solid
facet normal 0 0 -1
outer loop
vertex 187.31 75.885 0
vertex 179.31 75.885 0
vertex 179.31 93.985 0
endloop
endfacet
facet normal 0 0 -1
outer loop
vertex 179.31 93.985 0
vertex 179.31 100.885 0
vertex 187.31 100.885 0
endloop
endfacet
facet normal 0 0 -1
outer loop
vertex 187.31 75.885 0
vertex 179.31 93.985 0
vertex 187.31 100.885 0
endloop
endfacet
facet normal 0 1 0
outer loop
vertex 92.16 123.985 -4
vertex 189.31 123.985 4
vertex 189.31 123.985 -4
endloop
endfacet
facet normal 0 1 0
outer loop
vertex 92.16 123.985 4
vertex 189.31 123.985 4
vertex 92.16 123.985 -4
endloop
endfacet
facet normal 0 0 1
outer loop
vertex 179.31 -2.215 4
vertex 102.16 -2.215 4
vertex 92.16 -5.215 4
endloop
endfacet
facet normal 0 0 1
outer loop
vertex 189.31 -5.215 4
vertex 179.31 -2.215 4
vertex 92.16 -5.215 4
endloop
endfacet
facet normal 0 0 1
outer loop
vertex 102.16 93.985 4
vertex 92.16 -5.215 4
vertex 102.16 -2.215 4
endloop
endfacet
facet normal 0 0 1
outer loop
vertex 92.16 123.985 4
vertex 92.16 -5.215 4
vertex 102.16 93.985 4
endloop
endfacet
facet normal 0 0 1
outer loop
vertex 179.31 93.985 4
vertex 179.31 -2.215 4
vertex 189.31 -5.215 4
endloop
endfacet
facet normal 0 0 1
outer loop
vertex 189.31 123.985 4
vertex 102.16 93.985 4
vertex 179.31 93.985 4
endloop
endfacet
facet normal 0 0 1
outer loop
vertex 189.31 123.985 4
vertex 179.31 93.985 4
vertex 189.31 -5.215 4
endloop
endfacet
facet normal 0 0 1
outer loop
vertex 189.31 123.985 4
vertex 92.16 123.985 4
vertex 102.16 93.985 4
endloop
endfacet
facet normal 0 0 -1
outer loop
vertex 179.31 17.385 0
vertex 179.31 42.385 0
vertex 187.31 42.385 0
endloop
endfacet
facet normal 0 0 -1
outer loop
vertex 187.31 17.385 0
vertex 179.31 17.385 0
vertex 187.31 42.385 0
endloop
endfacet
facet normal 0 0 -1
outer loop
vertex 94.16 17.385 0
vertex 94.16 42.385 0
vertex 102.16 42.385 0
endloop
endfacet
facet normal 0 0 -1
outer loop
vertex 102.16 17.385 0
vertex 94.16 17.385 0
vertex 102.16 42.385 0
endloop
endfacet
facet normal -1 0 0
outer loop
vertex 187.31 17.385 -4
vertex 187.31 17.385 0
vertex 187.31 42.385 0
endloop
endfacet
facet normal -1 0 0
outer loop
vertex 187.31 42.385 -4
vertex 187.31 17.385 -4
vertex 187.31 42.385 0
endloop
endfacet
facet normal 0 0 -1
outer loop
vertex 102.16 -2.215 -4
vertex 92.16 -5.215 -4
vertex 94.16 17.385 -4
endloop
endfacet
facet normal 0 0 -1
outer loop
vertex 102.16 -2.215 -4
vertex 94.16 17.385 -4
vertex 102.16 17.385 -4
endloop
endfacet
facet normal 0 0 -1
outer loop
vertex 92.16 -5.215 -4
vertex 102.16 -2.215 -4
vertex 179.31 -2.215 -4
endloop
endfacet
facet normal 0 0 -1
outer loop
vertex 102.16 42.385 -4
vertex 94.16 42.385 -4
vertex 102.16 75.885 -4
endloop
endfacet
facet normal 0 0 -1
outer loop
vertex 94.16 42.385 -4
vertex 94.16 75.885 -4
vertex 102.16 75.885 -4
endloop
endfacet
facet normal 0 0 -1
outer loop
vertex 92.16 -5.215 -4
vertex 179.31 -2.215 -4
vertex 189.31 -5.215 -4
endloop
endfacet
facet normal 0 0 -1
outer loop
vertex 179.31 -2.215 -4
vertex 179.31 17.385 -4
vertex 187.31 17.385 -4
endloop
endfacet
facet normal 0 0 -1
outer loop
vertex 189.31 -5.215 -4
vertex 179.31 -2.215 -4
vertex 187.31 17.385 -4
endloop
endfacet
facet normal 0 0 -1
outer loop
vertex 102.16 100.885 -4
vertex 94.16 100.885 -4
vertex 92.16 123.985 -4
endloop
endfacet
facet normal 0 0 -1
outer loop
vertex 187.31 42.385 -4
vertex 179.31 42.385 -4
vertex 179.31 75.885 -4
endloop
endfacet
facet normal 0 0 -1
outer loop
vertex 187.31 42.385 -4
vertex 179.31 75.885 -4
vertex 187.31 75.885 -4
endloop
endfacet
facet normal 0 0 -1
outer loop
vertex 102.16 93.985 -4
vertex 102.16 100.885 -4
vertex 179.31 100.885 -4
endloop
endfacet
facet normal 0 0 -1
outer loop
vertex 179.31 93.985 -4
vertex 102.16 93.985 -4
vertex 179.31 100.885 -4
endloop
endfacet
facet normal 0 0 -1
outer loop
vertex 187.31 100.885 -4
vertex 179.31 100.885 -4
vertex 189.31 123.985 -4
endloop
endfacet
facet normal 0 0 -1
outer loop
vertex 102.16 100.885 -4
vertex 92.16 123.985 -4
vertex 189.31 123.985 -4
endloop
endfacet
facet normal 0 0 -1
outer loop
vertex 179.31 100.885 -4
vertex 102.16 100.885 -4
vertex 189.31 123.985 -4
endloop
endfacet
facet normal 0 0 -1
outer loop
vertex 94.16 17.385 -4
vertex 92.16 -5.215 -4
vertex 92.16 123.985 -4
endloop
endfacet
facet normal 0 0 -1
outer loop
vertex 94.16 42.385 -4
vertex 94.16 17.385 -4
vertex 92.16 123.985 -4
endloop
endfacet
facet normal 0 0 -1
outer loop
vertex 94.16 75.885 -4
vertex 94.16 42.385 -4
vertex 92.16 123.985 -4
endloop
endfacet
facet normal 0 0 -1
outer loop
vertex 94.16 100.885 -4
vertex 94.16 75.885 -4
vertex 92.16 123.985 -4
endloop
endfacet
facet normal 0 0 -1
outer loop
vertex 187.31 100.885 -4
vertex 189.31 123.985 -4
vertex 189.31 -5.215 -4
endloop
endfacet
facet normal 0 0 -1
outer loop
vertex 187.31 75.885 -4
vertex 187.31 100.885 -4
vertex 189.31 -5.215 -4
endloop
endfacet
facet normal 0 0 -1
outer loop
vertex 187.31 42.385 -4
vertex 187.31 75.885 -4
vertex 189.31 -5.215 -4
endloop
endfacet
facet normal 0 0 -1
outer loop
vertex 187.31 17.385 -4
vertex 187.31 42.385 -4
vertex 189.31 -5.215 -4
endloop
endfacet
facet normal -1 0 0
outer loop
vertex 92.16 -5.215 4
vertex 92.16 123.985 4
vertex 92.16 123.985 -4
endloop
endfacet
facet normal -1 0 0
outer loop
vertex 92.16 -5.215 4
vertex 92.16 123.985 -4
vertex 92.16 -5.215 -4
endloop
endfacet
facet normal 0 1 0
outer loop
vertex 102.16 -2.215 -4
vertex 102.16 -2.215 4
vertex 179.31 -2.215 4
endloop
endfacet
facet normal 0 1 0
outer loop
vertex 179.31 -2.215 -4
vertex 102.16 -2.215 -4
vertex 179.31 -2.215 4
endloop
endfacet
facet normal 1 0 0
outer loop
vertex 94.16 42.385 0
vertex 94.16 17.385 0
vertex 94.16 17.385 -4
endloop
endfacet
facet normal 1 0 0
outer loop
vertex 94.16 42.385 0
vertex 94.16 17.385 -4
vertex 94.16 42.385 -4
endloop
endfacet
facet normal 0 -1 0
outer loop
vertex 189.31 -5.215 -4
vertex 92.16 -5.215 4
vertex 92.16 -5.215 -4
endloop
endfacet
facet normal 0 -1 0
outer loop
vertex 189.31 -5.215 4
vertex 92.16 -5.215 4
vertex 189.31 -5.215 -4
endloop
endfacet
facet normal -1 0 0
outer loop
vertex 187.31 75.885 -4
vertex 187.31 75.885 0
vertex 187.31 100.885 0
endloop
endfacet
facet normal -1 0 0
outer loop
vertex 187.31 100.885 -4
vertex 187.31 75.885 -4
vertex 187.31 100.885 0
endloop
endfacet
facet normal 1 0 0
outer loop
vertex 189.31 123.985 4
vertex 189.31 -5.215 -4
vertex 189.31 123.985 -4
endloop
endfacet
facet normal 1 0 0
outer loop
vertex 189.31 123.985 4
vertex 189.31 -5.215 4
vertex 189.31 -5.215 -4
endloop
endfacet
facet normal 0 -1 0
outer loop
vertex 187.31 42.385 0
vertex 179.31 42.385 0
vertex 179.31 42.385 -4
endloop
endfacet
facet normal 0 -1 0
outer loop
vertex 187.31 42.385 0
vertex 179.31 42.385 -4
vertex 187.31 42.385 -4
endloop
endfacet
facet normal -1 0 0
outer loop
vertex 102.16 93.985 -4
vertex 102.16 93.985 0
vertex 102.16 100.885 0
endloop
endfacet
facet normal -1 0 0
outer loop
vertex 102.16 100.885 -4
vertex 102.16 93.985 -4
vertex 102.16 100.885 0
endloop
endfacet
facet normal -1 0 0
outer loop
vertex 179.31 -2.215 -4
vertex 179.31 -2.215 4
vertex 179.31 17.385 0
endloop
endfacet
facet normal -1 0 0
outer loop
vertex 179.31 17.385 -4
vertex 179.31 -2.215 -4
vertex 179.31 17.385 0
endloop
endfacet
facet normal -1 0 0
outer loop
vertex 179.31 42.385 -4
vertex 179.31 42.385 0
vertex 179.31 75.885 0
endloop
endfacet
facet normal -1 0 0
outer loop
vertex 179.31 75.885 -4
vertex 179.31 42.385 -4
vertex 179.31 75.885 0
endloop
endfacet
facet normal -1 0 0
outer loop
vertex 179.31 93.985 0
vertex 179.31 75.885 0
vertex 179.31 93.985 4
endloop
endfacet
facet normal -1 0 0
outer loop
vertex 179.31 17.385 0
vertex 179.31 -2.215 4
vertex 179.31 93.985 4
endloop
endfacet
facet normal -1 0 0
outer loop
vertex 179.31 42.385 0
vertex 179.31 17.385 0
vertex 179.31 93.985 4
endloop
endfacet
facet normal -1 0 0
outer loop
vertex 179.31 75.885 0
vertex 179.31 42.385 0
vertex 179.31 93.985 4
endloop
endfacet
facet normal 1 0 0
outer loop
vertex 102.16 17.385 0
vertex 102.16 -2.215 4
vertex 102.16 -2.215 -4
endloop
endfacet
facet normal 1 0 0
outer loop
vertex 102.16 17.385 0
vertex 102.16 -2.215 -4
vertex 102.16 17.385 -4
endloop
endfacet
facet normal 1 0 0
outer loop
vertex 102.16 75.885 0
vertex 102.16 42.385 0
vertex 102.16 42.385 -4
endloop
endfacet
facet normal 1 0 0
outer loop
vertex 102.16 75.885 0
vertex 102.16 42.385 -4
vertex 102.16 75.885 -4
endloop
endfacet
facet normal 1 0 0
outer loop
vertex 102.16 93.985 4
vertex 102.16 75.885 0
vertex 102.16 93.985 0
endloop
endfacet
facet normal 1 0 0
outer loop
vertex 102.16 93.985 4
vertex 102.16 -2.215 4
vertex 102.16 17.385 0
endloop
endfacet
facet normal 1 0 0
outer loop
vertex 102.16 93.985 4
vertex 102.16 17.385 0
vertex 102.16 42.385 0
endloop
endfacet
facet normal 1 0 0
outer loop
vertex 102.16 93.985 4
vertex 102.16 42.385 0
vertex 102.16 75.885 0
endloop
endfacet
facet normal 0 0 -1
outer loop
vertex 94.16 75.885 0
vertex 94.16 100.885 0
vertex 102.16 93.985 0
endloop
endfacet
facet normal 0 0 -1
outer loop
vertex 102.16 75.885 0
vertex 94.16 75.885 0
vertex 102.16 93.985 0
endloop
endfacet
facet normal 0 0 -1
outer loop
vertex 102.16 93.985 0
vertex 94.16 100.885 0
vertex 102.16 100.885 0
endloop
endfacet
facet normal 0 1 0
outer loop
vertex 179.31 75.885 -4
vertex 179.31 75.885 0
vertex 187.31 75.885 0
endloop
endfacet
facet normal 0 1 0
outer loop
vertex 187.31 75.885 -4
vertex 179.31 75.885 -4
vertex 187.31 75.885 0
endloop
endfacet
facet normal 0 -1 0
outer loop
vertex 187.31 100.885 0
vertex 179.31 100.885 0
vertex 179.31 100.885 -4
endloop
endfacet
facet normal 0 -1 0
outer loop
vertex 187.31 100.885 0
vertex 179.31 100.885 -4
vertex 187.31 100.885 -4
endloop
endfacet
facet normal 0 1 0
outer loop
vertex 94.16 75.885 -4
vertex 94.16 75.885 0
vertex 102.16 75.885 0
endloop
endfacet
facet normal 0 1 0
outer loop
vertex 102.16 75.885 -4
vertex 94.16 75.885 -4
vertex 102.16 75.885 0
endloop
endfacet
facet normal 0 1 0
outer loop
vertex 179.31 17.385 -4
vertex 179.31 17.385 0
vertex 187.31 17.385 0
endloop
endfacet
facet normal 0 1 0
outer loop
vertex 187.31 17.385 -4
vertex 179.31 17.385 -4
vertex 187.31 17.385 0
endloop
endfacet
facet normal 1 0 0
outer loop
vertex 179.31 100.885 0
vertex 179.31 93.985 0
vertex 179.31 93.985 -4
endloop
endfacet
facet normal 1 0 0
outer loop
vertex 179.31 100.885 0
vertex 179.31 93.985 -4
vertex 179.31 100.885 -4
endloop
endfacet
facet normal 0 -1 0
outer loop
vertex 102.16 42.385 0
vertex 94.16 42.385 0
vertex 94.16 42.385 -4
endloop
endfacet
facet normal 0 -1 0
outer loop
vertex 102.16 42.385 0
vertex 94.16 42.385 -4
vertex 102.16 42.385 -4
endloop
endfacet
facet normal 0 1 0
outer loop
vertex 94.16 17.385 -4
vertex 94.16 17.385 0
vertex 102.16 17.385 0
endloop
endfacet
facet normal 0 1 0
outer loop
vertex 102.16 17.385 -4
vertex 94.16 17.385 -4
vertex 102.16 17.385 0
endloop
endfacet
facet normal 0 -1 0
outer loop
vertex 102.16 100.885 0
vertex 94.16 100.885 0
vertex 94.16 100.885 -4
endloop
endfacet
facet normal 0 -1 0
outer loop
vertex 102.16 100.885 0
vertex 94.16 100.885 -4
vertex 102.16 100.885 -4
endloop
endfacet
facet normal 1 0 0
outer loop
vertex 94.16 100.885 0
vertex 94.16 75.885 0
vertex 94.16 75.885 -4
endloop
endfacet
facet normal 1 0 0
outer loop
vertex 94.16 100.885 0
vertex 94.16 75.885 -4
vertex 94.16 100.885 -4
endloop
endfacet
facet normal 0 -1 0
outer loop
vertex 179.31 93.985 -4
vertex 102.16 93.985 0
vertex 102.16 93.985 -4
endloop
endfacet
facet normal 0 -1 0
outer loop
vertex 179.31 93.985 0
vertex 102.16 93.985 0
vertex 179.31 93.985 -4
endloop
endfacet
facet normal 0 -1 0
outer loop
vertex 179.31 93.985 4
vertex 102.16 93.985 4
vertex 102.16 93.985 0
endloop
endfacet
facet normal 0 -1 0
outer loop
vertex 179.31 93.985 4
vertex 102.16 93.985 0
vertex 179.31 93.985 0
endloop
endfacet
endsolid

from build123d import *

# Parameters (mm, degrees)
MODEL_W             = 77.14935
MODEL_H             = 96.19946
EXTRUDE_1_DEPTH     = 4
SKETCH_4_W          = 8
SKETCH_4_H          = 25
CUT_EXTRUDE_1_DEPTH = 227.33223095


with BuildPart() as part:
    # Model → 凸台-拉伸1 (new, symmetric)
    with BuildSketch(Plane.XY):
        Polygon((189.309527429, 123.984602236), (92.160177429, 123.984602236), (92.160177429, -5.214857764), (102.160177429, -5.214857764), (189.309527429, -5.214857764), align=None)
        with Locations((140.734852429, 45.884872236)):
            Rectangle(MODEL_W, MODEL_H, mode=Mode.SUBTRACT)
    extrude(amount=EXTRUDE_1_DEPTH, both=True)

    # 草图4 → 切除-拉伸1 (cut, through all)
    with BuildSketch(Plane.XY):
        with Locations((98.160177429, 29.884872236)):
            Rectangle(SKETCH_4_W, SKETCH_4_H)
        with Locations((183.309527429, 88.384872236)):
            Rectangle(SKETCH_4_W, SKETCH_4_H)
        with Locations((98.160177429, 88.384872236)):
            Rectangle(SKETCH_4_W, SKETCH_4_H)
        with Locations((183.309527429, 29.884872236)):
            Rectangle(SKETCH_4_W, SKETCH_4_H)
    extrude(amount=-CUT_EXTRUDE_1_DEPTH, mode=Mode.SUBTRACT)


solid = part.part
